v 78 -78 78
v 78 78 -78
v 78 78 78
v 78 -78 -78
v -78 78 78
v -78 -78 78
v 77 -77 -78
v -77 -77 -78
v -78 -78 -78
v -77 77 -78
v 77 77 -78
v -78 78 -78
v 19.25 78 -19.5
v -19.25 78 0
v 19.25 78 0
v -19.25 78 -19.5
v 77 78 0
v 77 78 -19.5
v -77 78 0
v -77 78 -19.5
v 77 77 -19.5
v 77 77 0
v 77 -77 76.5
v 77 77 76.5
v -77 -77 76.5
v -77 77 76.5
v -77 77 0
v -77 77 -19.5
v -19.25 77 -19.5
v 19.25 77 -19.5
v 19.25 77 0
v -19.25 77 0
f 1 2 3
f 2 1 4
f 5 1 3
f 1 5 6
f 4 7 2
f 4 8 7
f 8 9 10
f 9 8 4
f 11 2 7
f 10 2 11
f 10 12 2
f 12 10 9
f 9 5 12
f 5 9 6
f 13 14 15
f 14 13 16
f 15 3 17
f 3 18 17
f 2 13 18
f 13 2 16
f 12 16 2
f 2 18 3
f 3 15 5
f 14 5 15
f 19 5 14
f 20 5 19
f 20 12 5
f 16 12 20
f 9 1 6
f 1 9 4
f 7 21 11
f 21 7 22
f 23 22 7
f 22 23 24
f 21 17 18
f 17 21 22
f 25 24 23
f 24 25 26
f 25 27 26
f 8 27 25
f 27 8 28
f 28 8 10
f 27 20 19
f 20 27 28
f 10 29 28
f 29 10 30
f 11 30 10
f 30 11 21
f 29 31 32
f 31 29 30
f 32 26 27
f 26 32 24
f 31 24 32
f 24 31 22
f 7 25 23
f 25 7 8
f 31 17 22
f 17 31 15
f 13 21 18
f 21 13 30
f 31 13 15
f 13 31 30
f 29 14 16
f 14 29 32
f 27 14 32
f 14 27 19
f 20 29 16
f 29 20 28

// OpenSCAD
/* [Lamp parameters] */
inside = 154;
thickness = 1;

outside = inside + 2 * thickness;

difference() {
    cube([ outside, outside, outside ], center = true);
    translate([ 0, 0, -thickness ]) cube([ inside, inside, inside + thickness ], center = true);
    translate([ inside * 2.5 / 8, outside * 0.5 - thickness / 2, -outside * 0.5 / 8 ]) {
        cube([ inside * 3 / 8, 2 * thickness, outside * 1 / 8 ], center = true);
    }
    translate([ -inside * 2.5 / 8, outside * 0.5 - thickness / 2, -outside * 0.5 / 8 ]) {
        cube([ inside * 3 / 8, 2 * thickness, outside * 1 / 8 ], center = true);
    }
}
